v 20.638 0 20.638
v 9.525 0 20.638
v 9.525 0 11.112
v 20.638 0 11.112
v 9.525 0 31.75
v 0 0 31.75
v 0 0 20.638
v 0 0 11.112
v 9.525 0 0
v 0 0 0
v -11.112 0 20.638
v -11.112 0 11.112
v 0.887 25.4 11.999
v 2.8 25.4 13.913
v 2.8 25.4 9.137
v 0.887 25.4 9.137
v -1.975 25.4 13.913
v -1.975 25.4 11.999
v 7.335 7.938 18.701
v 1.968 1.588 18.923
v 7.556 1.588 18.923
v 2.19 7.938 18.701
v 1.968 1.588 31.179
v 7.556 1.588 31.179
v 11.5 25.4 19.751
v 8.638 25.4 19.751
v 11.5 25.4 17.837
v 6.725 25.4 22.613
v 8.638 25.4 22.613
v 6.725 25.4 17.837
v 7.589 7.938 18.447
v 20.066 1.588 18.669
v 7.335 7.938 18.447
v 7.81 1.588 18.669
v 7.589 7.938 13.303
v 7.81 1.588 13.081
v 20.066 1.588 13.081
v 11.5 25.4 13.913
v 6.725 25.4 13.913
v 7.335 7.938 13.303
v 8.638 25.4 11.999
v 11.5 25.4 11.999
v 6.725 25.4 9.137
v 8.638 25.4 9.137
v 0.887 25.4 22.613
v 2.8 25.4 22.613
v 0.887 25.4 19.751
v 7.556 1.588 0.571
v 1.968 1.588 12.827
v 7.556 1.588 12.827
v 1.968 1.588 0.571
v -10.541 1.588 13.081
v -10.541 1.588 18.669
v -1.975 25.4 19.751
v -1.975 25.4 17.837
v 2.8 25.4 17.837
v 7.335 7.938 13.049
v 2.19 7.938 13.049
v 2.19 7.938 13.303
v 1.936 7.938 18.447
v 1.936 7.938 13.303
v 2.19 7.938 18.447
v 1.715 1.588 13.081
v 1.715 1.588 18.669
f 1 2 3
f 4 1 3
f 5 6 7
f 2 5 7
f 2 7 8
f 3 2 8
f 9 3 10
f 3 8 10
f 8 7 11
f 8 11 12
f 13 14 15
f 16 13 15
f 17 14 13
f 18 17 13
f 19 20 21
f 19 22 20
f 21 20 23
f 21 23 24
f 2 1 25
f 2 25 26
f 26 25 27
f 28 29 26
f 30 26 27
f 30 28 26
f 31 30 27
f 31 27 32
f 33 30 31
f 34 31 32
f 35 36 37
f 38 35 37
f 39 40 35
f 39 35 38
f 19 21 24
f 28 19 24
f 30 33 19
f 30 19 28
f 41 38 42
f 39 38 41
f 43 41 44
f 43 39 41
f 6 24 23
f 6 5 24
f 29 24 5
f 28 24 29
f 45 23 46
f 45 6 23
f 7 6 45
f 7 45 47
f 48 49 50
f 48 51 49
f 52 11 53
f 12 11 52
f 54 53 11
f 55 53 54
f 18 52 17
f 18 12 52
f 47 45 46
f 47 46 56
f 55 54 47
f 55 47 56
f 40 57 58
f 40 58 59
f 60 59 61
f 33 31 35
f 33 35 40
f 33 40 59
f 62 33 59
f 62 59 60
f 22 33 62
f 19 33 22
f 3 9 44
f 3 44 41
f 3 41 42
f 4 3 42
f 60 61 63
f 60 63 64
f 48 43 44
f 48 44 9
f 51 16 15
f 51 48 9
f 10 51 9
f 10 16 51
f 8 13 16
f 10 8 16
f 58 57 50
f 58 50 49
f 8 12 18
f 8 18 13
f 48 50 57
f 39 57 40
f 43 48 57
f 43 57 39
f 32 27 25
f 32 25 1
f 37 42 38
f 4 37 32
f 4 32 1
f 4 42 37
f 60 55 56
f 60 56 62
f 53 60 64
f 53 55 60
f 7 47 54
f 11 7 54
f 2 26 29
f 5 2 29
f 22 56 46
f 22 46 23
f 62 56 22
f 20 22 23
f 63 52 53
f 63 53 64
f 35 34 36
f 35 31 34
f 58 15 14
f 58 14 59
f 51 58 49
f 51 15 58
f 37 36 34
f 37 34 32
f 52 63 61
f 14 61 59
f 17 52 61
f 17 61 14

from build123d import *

# Parameters (mm, degrees)
F1_DEPTH       = 25.4
F1_TAPER       = 2
F3_DEPTH       = 31.7510001
F5_DEPTH       = 20.6385001
F5_DEPTH_BACK  = 11.1135001
F6_W           = 6.096
F6_H           = 6.096
F7_DEPTH       = 6.35
F7_TAPER       = 2
F8_W           = 60.6717504561
F8_H           = 50.1286070794
F9_DEPTH       = 31.7510001
F10_W          = 37.0408929884
F10_H          = 41.4357688278
F11_DEPTH      = 11.1135001
F11_DEPTH_BACK = 20.6385001


with BuildPart() as f1:
    # F0 (on Front) → F1 (new body)
    with BuildSketch(Plane.XZ):
        Polygon((9.525, 31.75), (0, 31.75), (0, 20.6375), (-11.1125, 20.6375), (-11.1125, 11.1125), (0, 11.1125), (0, 0), (9.525, 0), (9.525, 11.1125), (20.6375, 11.1125), (20.6375, 20.6375), (9.525, 20.6375), align=None)
    extrude(amount=-F1_DEPTH, taper=F1_TAPER)

    # F2 (on Top) → F3 (cut, through all)
    with BuildSketch(Plane.XY):
        Polygon((2.8000508235, 25.4), (1.9685, 1.5875), (7.5565, 1.5875), (6.7249491765, 25.4), align=None)
    extrude(amount=F3_DEPTH, mode=Mode.SUBTRACT)

    # F4 (on Right) → F5 (cut, two sides)
    with BuildSketch(Plane.YZ) as f5_sk:
        Polygon((25.4, 17.8374491765), (1.5875, 18.669), (1.5875, 13.081), (25.4, 13.9125508235), align=None)
    extrude(amount=F5_DEPTH, mode=Mode.SUBTRACT)
    extrude(f5_sk.sketch, amount=-F5_DEPTH_BACK, mode=Mode.SUBTRACT)

    # F6 (on face) → F7 (join)
    with BuildSketch(Plane(origin=(0, 1.5875, 0), x_dir=(-1, 0, 0), z_dir=(0, 1, 0))):
        with Locations((-4.7625, 15.875)):
            Rectangle(F6_W, F6_H)
    extrude(amount=F7_DEPTH, taper=F7_TAPER)

    # F8 (on Top) → F9 (cut, through all)
    with BuildSketch(Plane.XY):
        with Locations((4.5310724527, 13.3044691756)):
            Rectangle(F8_W, F8_H)
        Polygon((20.6375, 0), (-11.1125, 0), (-1.9751491765, 25.4), (11.5001491765, 25.4), align=None, mode=Mode.SUBTRACT)
    extrude(amount=F9_DEPTH, mode=Mode.SUBTRACT)

    # F10 (on Right) → F11 (cut, two sides)
    with BuildSketch(Plane.YZ) as f11_sk:
        with Locations((11.8458718061, 15.7928168774)):
            Rectangle(F10_W, F10_H)
        Polygon((0, 0), (0, 31.75), (25.4, 22.6126491765), (25.4, 9.1373508235), align=None, mode=Mode.SUBTRACT)
    extrude(amount=-F11_DEPTH, mode=Mode.SUBTRACT)
    extrude(f11_sk.sketch, amount=F11_DEPTH_BACK, mode=Mode.SUBTRACT)


solid = f1.part
